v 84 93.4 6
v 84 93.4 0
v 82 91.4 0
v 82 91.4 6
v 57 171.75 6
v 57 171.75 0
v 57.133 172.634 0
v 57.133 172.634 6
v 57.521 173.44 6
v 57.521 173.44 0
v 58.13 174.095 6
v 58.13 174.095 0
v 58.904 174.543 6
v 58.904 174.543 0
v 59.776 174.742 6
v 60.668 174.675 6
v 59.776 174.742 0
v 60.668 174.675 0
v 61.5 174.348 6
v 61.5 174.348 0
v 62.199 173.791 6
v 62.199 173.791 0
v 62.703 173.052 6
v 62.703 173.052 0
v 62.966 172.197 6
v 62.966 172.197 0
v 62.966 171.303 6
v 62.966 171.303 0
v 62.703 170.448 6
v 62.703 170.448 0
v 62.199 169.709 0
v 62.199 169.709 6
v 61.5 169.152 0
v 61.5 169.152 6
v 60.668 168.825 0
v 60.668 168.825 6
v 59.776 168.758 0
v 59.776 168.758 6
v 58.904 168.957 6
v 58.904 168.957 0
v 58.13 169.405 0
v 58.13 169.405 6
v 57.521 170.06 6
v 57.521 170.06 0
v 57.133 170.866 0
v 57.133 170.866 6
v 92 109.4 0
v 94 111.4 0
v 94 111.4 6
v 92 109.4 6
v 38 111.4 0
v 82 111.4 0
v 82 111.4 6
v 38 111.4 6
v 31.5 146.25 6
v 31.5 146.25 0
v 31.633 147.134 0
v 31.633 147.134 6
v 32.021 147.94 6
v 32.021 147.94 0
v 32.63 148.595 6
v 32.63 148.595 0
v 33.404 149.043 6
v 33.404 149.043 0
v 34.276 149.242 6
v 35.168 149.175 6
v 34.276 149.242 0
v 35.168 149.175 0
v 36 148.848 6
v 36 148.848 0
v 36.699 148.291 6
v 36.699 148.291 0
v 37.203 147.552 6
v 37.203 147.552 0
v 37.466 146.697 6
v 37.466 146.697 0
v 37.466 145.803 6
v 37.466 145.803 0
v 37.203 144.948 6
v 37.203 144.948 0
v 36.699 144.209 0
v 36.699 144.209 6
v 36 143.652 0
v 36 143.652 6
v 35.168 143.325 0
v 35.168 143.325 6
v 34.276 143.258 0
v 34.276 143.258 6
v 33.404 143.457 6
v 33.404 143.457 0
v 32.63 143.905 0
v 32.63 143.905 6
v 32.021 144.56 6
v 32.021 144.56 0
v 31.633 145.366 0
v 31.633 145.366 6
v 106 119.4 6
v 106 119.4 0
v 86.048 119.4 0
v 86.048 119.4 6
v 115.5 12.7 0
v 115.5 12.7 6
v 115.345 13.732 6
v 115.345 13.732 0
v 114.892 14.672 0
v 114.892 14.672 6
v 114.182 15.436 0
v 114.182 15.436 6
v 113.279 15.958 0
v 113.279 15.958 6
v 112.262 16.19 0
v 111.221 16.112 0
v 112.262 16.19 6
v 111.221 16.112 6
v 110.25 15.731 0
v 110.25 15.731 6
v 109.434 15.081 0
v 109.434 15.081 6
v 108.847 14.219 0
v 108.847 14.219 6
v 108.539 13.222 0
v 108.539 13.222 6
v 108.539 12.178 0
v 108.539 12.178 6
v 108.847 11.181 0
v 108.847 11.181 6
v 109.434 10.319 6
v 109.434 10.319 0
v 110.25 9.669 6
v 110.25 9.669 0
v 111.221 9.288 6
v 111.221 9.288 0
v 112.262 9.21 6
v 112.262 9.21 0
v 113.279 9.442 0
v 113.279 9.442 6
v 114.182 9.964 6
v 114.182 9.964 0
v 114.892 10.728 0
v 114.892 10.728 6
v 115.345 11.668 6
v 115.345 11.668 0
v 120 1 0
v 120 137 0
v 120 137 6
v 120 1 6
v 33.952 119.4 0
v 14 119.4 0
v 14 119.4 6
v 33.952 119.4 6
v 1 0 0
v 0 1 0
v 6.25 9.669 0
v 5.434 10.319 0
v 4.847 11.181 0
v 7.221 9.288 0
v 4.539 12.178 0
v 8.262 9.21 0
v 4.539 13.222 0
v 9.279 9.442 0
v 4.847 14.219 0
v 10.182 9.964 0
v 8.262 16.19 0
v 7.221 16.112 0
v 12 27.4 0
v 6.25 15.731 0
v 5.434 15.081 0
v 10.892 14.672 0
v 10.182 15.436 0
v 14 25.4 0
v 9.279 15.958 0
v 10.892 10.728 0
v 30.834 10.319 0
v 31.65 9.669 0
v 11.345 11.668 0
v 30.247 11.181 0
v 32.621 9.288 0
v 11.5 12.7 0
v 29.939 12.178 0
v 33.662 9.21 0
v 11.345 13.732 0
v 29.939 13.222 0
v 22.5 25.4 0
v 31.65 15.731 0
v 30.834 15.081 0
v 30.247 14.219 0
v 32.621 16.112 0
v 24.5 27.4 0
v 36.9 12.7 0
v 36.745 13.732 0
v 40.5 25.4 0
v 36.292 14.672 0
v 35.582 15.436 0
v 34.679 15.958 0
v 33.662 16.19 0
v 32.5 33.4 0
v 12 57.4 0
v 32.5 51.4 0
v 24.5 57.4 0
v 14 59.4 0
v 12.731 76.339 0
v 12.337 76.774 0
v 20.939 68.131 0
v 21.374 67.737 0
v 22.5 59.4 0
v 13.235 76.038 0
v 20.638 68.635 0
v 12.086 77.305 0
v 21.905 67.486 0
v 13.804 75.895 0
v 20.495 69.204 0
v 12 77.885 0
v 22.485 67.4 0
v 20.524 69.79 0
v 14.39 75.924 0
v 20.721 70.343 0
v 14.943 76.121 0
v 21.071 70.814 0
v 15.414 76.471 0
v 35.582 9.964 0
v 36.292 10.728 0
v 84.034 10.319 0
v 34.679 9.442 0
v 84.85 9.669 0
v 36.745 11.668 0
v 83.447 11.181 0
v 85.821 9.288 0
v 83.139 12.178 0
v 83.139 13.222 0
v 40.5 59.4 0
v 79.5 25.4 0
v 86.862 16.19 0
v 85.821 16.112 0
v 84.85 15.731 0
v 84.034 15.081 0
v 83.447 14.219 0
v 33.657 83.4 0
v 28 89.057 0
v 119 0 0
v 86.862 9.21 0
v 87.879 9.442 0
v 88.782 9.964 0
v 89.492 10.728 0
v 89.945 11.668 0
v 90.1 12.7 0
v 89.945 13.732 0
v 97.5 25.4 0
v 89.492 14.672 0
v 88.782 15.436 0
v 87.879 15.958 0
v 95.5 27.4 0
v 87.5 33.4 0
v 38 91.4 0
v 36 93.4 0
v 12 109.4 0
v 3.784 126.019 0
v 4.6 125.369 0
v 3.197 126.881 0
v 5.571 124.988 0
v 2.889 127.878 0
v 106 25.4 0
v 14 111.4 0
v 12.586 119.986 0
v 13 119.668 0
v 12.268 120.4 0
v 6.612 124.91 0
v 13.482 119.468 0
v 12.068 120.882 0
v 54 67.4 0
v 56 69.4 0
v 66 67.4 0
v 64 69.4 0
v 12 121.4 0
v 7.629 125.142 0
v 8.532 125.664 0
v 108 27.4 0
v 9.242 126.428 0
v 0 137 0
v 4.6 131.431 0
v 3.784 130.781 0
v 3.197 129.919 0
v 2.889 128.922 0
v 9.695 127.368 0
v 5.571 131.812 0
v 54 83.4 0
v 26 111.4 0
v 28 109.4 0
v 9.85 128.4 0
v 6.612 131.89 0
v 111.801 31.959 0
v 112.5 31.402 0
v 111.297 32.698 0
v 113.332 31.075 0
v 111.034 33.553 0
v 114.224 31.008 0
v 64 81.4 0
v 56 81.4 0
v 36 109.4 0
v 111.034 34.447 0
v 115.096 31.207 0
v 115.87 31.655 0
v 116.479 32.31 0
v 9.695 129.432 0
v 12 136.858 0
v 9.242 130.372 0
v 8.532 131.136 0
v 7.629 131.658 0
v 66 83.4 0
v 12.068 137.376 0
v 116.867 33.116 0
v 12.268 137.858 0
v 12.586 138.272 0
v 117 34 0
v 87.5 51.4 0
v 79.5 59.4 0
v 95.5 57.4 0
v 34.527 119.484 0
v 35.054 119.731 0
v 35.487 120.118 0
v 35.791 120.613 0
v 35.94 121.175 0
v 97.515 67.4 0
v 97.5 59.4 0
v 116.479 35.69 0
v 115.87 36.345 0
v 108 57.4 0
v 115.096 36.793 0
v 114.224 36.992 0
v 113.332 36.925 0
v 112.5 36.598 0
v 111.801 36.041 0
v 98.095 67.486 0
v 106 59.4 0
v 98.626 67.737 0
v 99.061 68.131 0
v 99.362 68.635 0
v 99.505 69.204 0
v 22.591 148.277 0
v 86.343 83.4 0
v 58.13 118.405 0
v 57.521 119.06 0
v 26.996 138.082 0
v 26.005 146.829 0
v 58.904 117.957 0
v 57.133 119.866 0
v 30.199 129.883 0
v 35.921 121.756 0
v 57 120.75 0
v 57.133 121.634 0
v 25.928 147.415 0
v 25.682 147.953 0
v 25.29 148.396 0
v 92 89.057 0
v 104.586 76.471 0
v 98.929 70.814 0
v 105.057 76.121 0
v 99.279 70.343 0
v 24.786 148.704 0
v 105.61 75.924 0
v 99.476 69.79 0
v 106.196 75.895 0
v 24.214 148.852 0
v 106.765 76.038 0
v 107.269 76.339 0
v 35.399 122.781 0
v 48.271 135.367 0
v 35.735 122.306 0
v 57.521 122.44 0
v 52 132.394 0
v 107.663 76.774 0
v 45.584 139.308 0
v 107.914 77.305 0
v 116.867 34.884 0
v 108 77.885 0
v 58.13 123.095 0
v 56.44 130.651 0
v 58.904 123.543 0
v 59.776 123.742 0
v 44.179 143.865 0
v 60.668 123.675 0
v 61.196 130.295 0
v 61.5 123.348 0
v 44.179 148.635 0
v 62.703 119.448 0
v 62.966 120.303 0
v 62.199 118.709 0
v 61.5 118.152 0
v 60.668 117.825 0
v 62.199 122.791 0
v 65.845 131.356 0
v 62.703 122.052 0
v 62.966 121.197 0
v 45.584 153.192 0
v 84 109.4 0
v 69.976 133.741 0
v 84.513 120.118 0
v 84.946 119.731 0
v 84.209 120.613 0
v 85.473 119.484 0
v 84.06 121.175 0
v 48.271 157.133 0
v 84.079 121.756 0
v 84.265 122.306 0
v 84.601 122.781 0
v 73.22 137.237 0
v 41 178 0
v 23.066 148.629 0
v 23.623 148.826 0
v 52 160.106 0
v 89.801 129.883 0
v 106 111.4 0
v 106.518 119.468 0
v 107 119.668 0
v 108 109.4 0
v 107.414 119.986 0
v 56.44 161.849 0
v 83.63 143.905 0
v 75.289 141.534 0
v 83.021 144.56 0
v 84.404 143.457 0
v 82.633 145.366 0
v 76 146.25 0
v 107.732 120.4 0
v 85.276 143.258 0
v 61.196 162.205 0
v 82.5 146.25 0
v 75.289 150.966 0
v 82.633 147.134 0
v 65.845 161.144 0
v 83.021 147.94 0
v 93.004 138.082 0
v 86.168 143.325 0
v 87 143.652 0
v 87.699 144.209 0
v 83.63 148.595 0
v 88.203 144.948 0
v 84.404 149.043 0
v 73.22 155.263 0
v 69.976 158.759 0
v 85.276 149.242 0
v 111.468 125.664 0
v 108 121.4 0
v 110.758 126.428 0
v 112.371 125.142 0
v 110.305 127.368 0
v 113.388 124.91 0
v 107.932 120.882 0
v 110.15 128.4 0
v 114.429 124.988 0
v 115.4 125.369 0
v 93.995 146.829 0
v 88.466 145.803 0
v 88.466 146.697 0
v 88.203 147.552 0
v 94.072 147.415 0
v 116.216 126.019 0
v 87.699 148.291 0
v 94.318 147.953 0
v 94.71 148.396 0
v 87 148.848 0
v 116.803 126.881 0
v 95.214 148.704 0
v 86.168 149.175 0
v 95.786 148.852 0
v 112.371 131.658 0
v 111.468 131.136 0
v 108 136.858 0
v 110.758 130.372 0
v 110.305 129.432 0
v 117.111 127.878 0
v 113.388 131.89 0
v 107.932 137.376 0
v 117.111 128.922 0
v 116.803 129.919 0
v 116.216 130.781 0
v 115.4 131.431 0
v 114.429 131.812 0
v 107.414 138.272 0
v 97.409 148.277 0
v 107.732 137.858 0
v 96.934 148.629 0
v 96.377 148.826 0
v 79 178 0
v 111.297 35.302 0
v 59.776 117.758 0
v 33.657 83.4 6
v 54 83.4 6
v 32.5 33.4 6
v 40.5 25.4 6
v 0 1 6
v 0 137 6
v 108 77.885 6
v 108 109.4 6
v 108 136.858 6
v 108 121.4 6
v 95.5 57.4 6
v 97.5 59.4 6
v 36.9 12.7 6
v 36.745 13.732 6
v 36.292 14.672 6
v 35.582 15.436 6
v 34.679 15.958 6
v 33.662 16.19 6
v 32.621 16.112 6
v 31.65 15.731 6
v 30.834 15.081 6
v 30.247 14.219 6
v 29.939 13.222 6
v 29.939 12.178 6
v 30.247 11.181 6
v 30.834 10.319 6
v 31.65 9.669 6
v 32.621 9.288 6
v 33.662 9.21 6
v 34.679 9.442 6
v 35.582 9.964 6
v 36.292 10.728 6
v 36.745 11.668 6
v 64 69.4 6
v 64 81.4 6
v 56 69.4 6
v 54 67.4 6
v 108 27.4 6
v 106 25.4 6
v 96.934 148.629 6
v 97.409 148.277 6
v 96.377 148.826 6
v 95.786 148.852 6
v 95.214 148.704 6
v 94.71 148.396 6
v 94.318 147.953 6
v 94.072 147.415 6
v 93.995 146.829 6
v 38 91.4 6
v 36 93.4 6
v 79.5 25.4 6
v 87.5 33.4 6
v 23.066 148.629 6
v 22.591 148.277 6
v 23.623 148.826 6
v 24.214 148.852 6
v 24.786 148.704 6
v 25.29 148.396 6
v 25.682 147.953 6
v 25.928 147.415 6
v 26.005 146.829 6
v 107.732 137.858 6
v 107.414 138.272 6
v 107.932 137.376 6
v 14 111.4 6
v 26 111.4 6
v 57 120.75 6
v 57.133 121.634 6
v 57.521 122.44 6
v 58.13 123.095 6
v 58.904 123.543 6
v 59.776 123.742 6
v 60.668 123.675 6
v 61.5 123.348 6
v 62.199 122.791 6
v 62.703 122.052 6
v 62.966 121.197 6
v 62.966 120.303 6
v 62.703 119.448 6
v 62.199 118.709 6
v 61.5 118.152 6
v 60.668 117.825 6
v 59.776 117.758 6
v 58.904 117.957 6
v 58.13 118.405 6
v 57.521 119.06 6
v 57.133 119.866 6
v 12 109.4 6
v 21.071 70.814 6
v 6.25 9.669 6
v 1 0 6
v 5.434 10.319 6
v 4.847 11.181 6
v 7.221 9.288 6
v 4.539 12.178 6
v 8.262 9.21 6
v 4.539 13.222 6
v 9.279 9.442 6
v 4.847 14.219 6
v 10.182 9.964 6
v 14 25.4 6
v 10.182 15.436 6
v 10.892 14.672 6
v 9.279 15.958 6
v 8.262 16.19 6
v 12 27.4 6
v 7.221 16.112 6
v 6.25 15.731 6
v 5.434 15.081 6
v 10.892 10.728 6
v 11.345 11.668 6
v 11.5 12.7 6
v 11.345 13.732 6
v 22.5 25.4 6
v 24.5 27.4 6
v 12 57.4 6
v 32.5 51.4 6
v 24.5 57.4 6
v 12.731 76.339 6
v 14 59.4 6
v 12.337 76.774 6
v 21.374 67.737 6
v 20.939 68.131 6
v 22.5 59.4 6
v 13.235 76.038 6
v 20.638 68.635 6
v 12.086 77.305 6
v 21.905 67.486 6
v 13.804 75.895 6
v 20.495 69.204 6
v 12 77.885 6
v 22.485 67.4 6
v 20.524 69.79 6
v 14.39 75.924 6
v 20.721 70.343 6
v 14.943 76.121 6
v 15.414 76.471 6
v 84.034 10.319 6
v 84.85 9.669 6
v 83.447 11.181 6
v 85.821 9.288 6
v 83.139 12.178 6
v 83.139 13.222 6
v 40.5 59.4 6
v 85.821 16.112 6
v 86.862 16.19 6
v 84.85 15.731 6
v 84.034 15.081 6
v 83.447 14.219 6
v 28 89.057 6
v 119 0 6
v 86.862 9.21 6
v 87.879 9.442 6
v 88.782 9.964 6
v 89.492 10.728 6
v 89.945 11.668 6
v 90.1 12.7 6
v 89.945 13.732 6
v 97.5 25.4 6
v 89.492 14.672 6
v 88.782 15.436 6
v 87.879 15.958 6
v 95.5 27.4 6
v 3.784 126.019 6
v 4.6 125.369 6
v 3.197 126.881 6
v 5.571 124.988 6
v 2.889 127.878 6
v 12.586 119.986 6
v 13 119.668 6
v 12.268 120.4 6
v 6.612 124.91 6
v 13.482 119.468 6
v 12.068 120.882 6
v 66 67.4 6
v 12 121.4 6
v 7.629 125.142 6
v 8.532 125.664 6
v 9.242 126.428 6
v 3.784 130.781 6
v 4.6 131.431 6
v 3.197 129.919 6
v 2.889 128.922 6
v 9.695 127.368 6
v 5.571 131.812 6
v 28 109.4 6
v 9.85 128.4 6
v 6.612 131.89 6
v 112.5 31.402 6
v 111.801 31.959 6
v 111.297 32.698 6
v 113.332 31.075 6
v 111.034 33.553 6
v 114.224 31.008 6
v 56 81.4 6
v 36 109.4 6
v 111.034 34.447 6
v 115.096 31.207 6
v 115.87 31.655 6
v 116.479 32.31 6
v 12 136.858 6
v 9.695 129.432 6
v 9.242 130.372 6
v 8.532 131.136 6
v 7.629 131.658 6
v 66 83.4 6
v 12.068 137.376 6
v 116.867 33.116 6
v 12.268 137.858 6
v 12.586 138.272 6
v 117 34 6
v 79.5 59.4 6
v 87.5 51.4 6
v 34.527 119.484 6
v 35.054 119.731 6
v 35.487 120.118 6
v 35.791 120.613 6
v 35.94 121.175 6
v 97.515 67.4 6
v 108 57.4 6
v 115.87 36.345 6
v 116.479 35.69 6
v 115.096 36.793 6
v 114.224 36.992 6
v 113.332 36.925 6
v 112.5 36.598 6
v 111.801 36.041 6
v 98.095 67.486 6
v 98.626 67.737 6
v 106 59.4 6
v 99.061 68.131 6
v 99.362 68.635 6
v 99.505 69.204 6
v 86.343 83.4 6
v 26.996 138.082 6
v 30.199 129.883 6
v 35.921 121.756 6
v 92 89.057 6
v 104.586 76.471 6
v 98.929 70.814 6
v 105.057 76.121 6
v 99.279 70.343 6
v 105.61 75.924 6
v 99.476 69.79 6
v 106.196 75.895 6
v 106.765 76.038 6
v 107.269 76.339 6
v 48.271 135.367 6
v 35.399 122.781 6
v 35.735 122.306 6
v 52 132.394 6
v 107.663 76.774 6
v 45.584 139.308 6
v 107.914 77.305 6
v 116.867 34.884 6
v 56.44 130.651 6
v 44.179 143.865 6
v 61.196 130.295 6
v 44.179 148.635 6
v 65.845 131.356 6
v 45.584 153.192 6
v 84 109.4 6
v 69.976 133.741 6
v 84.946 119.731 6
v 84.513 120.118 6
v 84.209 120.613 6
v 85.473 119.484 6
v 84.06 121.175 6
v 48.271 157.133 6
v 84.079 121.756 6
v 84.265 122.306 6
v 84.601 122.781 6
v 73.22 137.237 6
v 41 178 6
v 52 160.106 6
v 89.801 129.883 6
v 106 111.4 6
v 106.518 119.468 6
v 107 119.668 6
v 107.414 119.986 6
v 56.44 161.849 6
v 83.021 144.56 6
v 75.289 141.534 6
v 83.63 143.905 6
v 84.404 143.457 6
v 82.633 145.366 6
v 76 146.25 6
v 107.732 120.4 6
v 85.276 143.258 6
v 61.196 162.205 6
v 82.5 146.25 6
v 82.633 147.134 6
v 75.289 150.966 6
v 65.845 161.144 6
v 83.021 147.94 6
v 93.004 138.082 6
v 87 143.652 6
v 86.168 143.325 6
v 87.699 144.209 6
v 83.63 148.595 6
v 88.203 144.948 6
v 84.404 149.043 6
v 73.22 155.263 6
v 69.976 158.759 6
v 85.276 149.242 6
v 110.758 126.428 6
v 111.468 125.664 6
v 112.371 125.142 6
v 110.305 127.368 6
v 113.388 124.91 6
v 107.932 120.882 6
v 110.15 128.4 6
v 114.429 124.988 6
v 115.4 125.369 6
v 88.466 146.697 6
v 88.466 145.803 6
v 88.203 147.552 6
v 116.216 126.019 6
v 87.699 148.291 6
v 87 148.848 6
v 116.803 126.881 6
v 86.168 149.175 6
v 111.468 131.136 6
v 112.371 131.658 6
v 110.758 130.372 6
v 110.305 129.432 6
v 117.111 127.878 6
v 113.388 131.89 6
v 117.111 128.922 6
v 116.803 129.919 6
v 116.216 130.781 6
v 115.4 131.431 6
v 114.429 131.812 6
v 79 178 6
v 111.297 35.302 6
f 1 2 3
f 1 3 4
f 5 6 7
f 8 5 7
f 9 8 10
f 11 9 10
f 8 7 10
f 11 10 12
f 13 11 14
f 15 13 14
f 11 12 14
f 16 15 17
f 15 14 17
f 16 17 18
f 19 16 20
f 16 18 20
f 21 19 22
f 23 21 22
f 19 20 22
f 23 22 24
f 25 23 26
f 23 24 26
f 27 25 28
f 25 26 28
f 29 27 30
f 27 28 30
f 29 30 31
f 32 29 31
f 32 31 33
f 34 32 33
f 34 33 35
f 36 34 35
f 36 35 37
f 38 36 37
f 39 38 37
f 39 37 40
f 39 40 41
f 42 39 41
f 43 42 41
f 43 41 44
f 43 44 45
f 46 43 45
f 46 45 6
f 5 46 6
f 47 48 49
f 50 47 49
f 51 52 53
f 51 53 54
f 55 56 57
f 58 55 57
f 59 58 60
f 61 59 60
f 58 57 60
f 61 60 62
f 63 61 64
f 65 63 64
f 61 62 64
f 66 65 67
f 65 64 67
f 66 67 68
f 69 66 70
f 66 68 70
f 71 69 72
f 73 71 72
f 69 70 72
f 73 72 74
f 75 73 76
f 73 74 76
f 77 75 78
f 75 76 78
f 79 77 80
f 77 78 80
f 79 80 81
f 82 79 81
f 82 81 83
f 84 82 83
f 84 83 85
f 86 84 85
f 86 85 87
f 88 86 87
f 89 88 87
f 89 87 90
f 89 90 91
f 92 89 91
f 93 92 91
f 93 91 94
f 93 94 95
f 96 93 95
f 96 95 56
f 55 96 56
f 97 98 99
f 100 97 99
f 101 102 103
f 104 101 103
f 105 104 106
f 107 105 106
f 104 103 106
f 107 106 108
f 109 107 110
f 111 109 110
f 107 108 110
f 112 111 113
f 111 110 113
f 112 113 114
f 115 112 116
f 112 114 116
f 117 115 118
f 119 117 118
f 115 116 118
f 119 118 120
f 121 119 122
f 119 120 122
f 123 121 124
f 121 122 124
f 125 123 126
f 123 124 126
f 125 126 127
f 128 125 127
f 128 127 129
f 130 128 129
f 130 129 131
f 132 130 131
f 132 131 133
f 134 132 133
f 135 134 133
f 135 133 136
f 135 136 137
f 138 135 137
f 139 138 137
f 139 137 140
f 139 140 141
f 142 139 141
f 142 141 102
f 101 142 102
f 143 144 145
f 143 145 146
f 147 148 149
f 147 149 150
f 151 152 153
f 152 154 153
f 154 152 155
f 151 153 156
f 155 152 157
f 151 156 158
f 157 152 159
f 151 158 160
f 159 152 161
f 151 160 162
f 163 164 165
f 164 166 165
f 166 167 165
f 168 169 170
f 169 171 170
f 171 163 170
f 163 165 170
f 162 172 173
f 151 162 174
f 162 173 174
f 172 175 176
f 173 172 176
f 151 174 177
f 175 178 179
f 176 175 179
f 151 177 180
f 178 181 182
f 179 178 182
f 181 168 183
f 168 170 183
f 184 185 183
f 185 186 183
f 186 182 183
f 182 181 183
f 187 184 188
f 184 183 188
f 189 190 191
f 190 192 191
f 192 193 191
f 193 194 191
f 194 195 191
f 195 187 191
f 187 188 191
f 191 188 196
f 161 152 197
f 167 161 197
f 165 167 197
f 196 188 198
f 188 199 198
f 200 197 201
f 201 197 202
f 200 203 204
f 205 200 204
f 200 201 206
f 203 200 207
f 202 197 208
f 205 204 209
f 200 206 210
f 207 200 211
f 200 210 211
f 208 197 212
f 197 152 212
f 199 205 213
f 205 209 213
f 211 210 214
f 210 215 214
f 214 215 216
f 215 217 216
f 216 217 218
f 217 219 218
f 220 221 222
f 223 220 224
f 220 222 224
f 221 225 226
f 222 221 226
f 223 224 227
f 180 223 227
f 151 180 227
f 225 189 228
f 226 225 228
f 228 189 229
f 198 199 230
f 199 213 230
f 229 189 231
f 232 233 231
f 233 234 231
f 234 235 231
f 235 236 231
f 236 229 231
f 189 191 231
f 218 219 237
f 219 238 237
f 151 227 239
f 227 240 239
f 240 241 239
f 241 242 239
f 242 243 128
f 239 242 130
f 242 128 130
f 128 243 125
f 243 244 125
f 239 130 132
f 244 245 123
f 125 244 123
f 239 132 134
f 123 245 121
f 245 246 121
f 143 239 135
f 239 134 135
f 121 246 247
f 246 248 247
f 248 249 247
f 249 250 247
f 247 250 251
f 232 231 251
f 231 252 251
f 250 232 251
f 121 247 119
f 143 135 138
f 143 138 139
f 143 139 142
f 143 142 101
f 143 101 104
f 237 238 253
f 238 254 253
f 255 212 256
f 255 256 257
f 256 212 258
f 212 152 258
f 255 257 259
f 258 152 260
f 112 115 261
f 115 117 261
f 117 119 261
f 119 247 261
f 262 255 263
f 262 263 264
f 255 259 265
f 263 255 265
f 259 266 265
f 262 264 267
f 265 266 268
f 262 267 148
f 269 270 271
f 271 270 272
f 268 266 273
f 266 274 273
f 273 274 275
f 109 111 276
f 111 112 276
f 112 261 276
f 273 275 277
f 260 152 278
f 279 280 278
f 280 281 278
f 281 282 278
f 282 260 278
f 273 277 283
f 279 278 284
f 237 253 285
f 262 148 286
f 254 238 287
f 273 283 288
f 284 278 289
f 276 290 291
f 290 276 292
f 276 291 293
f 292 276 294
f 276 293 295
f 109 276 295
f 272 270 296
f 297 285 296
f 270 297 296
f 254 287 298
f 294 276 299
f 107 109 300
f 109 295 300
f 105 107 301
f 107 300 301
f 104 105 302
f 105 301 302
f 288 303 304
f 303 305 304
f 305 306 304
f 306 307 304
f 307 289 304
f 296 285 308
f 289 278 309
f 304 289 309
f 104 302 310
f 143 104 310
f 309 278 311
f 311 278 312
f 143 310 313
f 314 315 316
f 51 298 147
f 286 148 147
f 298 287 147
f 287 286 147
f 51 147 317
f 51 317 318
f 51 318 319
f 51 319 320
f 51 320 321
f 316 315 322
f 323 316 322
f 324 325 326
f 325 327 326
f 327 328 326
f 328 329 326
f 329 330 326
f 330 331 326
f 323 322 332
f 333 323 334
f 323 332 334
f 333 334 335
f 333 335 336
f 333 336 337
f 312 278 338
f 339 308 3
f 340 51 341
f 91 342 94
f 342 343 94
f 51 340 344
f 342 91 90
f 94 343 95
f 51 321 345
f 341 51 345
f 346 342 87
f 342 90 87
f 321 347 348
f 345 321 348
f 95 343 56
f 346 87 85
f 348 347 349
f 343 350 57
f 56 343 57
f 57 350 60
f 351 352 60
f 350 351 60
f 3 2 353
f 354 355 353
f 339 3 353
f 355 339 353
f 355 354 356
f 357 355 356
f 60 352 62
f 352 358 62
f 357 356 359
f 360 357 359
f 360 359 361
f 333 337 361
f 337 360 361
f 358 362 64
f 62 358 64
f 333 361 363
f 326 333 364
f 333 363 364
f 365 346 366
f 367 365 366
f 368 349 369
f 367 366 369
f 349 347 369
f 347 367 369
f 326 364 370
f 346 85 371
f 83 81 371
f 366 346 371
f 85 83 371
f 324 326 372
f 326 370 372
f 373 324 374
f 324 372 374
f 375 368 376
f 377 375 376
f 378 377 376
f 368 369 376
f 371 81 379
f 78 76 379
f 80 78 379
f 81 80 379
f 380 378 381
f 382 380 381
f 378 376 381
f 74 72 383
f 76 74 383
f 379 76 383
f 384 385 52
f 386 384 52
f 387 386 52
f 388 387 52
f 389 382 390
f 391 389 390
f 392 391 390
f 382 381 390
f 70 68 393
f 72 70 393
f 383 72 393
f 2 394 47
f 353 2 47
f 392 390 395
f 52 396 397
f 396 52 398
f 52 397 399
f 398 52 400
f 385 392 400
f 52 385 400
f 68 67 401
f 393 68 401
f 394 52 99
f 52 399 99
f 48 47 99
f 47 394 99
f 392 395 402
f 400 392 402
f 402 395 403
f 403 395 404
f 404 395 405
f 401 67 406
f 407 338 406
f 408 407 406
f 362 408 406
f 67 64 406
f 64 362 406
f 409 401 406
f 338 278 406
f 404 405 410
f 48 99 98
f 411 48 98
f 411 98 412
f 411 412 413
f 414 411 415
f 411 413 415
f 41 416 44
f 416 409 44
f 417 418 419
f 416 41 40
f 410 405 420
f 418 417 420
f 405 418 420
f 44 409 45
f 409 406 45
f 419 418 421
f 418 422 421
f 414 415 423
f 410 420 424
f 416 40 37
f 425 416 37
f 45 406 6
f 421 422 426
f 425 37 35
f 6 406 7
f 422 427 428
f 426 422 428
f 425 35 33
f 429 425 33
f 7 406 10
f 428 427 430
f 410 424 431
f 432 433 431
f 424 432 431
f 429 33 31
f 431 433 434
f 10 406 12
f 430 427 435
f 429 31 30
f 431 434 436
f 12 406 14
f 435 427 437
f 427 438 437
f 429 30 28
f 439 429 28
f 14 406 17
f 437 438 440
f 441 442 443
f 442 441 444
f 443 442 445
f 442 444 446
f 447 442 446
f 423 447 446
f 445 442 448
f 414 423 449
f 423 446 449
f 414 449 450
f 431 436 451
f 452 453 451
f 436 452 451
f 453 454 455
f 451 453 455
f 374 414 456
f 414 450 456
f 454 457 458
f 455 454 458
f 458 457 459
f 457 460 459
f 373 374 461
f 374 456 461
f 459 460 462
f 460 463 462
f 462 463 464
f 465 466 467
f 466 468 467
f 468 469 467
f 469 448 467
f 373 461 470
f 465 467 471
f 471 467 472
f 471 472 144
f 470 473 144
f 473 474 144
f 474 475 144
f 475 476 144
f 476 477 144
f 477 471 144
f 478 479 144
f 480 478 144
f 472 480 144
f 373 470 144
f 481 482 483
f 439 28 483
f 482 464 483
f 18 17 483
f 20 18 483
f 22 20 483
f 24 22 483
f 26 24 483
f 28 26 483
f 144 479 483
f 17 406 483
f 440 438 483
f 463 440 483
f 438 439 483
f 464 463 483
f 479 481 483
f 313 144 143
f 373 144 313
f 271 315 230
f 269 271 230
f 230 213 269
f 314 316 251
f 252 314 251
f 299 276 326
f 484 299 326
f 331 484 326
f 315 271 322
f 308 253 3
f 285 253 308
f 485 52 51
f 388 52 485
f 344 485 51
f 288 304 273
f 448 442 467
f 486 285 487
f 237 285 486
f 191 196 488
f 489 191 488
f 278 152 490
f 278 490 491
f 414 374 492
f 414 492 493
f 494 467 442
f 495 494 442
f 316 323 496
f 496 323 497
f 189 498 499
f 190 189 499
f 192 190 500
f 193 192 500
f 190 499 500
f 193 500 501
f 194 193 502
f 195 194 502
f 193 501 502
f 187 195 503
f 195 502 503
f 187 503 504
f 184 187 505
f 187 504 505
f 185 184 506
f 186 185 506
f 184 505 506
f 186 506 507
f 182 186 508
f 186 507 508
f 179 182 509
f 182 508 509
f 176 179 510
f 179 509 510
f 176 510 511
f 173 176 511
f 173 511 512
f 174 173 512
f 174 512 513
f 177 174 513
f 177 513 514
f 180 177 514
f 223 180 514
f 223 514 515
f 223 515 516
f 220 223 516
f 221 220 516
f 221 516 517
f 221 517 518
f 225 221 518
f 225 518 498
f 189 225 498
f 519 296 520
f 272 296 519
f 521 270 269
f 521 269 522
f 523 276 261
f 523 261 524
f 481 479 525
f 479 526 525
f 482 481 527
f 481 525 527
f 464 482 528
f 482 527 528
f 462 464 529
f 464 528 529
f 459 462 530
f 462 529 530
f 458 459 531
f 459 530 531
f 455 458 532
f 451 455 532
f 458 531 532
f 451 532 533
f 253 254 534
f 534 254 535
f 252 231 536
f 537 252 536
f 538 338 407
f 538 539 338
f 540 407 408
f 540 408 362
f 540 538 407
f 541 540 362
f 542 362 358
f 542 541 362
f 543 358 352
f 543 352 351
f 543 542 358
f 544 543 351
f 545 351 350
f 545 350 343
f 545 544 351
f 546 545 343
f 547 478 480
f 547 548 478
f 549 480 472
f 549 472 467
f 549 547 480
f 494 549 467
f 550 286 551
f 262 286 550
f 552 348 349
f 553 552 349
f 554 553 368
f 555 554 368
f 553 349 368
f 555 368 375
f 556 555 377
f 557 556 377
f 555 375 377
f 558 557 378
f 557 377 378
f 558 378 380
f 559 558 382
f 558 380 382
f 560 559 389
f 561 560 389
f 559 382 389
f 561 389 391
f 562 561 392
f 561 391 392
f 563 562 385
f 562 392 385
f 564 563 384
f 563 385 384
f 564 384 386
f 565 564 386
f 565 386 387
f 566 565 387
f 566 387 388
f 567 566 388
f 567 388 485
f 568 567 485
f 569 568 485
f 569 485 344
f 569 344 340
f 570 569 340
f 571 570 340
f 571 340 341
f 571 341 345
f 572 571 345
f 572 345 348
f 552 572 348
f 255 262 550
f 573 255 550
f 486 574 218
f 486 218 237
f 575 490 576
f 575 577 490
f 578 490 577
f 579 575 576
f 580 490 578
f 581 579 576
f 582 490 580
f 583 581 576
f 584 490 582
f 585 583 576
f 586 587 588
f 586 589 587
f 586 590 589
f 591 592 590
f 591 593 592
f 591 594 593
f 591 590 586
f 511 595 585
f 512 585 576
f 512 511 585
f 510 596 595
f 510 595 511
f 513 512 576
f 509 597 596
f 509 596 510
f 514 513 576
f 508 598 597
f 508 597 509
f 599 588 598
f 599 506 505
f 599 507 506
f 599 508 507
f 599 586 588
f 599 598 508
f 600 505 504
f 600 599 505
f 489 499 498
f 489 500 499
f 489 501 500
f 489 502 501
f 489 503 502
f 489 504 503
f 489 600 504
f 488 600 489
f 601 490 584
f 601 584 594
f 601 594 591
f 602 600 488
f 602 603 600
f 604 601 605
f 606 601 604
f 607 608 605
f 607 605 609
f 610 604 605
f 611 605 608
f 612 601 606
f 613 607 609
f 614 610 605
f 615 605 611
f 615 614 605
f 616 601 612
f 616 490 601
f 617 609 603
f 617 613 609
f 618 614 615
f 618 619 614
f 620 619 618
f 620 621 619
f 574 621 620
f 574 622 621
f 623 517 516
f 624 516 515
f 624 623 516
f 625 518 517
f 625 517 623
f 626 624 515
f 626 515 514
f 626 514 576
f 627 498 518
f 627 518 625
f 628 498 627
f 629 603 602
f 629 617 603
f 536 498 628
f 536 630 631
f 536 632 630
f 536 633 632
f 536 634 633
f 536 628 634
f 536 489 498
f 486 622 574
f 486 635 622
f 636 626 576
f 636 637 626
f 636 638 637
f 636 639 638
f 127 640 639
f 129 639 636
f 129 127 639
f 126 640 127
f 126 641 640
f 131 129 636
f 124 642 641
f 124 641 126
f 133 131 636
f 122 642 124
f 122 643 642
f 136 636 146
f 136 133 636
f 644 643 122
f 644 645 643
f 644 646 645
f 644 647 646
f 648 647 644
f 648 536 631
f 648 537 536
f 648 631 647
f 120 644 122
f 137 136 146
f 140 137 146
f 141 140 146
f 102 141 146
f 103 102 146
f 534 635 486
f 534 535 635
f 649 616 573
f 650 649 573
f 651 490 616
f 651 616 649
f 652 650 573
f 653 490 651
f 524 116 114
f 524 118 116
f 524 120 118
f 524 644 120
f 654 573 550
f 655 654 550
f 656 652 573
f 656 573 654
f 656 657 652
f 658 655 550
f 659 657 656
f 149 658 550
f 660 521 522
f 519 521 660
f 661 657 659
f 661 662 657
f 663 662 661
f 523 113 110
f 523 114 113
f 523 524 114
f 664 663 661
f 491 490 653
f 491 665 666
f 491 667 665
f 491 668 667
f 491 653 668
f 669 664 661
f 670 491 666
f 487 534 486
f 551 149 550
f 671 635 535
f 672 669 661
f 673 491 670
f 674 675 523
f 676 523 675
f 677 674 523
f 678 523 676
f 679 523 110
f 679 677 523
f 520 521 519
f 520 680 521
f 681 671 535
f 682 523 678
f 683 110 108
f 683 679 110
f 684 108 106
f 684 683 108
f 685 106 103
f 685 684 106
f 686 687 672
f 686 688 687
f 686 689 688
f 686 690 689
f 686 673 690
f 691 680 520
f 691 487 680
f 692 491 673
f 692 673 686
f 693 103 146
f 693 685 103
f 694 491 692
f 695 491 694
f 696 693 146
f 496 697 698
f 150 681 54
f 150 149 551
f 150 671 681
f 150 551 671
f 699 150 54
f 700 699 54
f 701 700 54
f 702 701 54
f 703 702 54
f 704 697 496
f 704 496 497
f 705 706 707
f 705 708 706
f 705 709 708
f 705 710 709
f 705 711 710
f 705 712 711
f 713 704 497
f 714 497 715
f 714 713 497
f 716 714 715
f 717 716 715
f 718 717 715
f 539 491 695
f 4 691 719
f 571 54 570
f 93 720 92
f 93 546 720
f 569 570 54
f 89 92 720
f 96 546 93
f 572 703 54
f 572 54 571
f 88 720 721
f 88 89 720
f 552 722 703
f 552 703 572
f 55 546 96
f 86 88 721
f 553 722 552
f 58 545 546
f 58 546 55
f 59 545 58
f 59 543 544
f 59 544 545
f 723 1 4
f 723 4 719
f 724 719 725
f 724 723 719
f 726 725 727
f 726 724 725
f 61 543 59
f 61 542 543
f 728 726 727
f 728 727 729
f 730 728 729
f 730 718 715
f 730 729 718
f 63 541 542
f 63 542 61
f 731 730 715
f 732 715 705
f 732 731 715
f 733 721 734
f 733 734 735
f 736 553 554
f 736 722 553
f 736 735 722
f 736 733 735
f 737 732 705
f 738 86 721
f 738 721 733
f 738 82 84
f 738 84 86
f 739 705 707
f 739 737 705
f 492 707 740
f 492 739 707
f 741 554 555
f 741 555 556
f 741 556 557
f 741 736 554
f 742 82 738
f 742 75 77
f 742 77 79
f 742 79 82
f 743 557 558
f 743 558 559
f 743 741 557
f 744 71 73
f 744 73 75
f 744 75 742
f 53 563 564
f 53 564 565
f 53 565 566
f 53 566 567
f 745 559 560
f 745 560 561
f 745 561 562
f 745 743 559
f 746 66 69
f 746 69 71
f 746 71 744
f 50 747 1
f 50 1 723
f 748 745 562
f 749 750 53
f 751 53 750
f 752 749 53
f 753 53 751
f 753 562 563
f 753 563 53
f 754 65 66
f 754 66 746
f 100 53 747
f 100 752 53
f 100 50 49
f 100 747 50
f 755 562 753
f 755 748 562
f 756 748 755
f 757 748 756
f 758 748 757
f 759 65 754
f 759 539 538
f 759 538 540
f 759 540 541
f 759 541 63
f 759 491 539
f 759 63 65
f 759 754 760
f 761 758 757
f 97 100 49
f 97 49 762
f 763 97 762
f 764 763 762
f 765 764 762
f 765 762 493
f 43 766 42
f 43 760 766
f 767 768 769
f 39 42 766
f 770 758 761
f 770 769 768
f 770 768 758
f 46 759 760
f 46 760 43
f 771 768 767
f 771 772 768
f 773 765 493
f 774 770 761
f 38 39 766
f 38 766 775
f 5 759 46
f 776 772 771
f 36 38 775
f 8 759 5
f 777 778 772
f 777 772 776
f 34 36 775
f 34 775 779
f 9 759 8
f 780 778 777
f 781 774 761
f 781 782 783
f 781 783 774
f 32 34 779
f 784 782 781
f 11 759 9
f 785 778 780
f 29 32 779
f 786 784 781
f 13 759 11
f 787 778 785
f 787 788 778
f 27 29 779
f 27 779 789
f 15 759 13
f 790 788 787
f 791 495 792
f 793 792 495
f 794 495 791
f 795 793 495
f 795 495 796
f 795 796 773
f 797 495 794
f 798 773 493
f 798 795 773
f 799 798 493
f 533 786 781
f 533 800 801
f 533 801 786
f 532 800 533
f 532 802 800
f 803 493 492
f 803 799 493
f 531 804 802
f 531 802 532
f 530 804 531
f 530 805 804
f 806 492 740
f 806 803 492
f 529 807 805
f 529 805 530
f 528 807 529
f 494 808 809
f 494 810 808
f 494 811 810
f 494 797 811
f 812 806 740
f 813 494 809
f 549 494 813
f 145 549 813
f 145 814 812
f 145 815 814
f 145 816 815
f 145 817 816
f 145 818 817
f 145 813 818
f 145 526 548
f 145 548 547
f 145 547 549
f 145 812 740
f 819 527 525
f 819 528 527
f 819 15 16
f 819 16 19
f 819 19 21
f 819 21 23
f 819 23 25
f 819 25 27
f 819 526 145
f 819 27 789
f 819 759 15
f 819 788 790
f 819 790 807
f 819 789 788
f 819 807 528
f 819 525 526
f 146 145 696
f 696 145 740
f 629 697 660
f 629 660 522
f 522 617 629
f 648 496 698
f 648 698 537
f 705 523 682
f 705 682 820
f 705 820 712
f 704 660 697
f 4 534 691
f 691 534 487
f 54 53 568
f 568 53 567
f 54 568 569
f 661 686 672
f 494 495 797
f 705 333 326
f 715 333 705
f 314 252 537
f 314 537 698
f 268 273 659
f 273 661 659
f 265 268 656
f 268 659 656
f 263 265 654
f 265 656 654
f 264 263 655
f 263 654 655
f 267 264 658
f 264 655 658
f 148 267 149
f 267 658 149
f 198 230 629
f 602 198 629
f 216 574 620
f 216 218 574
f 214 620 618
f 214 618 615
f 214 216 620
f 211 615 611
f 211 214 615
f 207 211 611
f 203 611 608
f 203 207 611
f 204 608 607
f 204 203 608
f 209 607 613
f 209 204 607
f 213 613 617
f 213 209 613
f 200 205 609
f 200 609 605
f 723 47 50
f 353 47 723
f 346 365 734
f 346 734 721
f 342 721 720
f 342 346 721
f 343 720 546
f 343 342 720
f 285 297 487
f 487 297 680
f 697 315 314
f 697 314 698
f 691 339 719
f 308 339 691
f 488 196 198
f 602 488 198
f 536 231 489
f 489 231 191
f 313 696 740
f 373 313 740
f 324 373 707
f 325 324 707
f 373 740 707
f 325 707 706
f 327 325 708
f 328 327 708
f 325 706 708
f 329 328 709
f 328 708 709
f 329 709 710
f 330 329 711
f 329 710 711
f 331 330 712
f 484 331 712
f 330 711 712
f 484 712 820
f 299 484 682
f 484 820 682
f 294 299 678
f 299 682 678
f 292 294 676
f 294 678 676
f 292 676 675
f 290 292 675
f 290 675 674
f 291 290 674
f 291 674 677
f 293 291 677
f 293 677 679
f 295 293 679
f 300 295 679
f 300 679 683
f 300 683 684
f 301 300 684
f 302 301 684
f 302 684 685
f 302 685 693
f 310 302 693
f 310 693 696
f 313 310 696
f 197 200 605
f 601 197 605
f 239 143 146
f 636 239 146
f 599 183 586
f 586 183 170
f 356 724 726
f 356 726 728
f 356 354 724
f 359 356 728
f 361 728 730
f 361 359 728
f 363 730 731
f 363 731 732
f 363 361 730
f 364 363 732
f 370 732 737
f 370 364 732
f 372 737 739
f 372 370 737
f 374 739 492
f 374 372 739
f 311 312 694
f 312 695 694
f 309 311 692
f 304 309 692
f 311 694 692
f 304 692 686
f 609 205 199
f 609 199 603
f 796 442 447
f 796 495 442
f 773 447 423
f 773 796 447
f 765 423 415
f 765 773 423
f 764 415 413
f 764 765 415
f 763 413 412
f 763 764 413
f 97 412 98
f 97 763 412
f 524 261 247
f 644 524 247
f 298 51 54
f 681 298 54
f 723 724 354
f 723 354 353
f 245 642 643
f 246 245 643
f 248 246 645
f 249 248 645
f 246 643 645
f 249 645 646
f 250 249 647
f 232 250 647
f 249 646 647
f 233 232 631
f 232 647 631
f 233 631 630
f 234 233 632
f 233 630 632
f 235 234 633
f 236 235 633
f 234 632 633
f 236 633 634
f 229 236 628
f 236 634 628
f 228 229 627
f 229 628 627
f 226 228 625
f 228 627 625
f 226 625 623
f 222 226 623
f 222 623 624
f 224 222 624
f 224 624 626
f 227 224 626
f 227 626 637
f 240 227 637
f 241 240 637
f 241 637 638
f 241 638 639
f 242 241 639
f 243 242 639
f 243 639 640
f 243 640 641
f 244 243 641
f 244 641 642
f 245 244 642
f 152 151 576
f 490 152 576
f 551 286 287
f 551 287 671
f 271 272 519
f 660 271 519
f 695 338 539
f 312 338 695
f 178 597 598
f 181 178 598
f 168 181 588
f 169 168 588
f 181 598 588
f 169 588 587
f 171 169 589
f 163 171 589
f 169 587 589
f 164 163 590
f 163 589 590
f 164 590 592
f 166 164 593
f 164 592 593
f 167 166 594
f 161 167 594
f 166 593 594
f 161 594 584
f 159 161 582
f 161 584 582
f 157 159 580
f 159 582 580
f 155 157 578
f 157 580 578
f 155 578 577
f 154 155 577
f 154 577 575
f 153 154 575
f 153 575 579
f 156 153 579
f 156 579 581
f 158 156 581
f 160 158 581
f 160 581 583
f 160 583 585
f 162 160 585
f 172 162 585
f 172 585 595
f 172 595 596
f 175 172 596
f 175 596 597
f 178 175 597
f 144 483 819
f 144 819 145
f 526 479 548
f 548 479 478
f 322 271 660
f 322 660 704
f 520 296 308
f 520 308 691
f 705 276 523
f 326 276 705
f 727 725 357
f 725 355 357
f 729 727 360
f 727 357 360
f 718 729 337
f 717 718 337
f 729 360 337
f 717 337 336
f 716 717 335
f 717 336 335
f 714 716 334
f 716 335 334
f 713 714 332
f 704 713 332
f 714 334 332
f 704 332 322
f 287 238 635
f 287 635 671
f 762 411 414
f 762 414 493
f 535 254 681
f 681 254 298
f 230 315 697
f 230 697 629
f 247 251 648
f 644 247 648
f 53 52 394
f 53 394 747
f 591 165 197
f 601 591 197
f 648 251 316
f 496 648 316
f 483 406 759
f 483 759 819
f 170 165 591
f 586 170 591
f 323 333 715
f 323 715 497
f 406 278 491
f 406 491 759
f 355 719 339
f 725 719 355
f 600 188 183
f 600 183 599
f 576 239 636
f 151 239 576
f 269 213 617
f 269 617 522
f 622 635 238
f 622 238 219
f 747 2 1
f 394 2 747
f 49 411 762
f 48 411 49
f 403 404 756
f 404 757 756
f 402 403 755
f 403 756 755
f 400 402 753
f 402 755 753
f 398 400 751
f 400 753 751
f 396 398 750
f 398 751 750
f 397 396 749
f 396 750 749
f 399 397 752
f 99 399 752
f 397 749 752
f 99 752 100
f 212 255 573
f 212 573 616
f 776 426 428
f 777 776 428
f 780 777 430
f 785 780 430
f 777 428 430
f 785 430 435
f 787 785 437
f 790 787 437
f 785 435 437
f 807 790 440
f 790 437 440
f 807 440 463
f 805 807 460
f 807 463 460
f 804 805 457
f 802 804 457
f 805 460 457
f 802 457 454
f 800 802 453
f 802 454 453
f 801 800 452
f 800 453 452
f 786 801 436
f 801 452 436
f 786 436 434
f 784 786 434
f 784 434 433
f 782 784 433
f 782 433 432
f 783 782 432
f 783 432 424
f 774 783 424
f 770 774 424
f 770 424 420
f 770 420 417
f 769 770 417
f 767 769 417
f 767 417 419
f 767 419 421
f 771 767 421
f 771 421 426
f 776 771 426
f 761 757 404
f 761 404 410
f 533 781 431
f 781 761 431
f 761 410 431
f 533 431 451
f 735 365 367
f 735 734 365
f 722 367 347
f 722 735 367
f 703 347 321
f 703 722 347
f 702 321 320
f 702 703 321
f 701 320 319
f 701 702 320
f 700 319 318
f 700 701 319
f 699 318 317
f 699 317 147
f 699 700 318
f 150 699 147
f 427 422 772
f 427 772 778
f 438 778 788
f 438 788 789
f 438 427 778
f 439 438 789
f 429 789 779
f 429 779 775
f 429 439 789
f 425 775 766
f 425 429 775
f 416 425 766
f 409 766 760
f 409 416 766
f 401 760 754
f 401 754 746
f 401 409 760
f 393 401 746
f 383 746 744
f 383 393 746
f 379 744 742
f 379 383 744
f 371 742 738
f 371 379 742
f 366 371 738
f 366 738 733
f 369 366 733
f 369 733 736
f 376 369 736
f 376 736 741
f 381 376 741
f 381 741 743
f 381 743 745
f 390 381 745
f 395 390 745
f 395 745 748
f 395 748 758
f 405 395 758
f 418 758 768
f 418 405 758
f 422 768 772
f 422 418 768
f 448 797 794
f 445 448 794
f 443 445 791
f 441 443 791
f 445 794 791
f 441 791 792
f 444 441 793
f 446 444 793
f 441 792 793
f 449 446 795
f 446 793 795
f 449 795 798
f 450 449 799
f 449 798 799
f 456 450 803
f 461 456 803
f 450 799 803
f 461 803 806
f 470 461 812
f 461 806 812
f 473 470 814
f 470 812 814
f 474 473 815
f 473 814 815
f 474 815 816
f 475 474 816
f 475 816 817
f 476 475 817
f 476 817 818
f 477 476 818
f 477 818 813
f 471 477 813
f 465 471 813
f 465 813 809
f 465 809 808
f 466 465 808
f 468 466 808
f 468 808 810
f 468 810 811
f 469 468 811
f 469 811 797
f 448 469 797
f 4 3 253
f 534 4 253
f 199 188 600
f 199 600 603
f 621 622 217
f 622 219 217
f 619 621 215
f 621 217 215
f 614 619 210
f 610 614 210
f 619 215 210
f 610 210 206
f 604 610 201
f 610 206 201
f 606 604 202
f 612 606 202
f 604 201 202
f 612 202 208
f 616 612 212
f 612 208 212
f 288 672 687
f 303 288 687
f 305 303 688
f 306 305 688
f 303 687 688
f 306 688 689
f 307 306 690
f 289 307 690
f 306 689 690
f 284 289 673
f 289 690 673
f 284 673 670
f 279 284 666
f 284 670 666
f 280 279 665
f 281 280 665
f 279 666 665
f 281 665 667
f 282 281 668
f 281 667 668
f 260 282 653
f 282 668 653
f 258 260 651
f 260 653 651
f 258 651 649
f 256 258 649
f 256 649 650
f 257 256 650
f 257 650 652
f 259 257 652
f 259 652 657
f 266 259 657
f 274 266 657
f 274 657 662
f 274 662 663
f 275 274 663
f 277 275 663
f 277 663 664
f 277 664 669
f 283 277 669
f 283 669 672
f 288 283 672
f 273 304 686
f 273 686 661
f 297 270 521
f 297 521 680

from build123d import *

# Parameters (mm, degrees)
ESBO_O1_R                = 16
RESSALTO_EXTRUS_O1_DEPTH = 6
ESBO_O2_R                = 3
ESBO_O2_W                = 55
ESBO_O2_H                = 34
ESBO_O2_W_2              = 48
ESBO_O2_H_2              = 20
ESBO_O2_W_3              = 12.5
CORTE_EXTRUS_O1_DEPTH    = 215.755675129
RESSALTO_EXTRUS_O2_DEPTH = 6
ESBO_O4_R                = 3.5
CORTE_EXTRUS_O2_DEPTH    = 215.755675129
FILETE1_R                = 2
CHANFRO1_SIZE            = 8
CHANFRO2_SIZE            = 2
ESBO_O5_R                = 3.5
CORTE_EXTRUS_O3_DEPTH    = 215.755675129
CHANFRO3_SIZE            = 1
ESBO_O8_R                = 3
CORTE_EXTRUS_O5_DEPTH    = 215.755675129


with BuildPart() as part:
    # Esboço1 → Ressalto-extrusão1 (new body)
    with BuildSketch(Plane.XY):
        Polygon((0, 0), (0, 137), (41, 178), (79, 178), (120, 137), (120, 0), align=None)
        with Locations((60, 146.25)):
            Circle(ESBO_O1_R, mode=Mode.SUBTRACT)
    extrude(amount=RESSALTO_EXTRUS_O1_DEPTH)

    # Esboço2 → Corte-extrusão1 (cut, through all)
    with BuildSketch(Plane(origin=(0, 0, 0), x_dir=(-1, 0, 0), z_dir=(0, 0, -1))):
        with Locations((-60, 171.75)):
            Circle(ESBO_O2_R)
        with Locations((-34.5, 146.25)):
            Circle(ESBO_O2_R)
        with Locations((-60, 120.75)):
            Circle(ESBO_O2_R)
        with Locations((-85.5, 146.25)):
            Circle(ESBO_O2_R)
        with Locations((-60, 42.4)):
            Rectangle(ESBO_O2_W, ESBO_O2_H)
        Polygon((-56, 83.4), (-28, 83.4), (-28, 111.4), (-12, 111.4), (-12, 67.4), (-56, 67.4), align=None)
        with Locations((-60, 101.4)):
            Rectangle(ESBO_O2_W_2, ESBO_O2_H_2)
        with Locations((-18.25, 42.4)):
            Rectangle(ESBO_O2_W_3, ESBO_O2_H)
        Polygon((-64, 83.4), (-64, 67.4), (-108, 67.4), (-108, 111.4), (-92, 111.4), (-92, 83.4), align=None)
        with Locations((-101.75, 42.4)):
            Rectangle(ESBO_O2_W_3, ESBO_O2_H)
        with BuildLine():
            Line((-93.472953207, 152.213338294), (-108, 137.686291501))
            Line((-108, 137.686291501), (-108, 119.4))
            Line((-108, 119.4), (-80.858511452, 119.4))
            ThreePointArc((-80.858511452, 119.4), (-91.735718134, 134.049828095), (-93.472953207, 152.213338294))
        make_face()
        with BuildLine():
            Line((-26.527046793, 152.213338294), (-12, 137.686291501))
            Line((-12, 137.686291501), (-12, 119.4))
            Line((-12, 119.4), (-39.141488548, 119.4))
            ThreePointArc((-39.141488548, 119.4), (-28.264281866, 134.049828095), (-26.527046793, 152.213338294))
        make_face()
    extrude(amount=-CORTE_EXTRUS_O1_DEPTH, mode=Mode.SUBTRACT)

    # Esboço3 → Ressalto-extrusão2 (add, through all)
    with BuildSketch(Plane.XY.offset(6)):
        Polygon((28, 89.056854249), (12, 73.056854249), (12, 67.4), (17.656854249, 67.4), (33.656854249, 83.4), (28, 83.4), align=None)
        Polygon((86.343145751, 83.4), (102.343145751, 67.4), (108, 67.4), (108, 73.056854249), (92, 89.056854249), (92, 83.4), align=None)
    extrude(amount=-RESSALTO_EXTRUS_O2_DEPTH)

    # Esboço4 → Corte-extrusão2 (cut, through all)
    with BuildSketch(Plane.XY.offset(6)):
        with Locations((8, 12.7)):
            Circle(ESBO_O4_R)
        with Locations((33.4, 12.7)):
            Circle(ESBO_O4_R)
        with Locations((86.6, 12.7)):
            Circle(ESBO_O4_R)
        with Locations((112, 12.7)):
            Circle(ESBO_O4_R)
    extrude(amount=-CORTE_EXTRUS_O2_DEPTH, mode=Mode.SUBTRACT)

    # Filete1
    filete1_edges = [part.edges().sort_by_distance(p)[0] for p in [
        (39.141488548, 119.4, 3),
        (26.527046793, 152.213338294, 3),
        (12, 137.686291501, 3),
        (12, 119.4, 3),
        (108, 73.056854249, 3),
        (102.343145751, 67.4, 3),
        (17.656854249, 67.4, 3),
        (12, 73.056854249, 3),
        (93.472953207, 152.213338294, 3),
        (80.858511452, 119.4, 3),
        (108, 119.4, 3),
        (108, 137.686291501, 3),
    ]]
    fillet(filete1_edges, radius=FILETE1_R)

    # Chanfro1
    chanfro1_edges = [part.edges().sort_by_distance(p)[0] for p in [
        (87.5, 25.4, 3),
        (87.5, 59.4, 3),
        (32.5, 59.4, 3),
        (32.5, 25.4, 3),
    ]]
    chamfer(chanfro1_edges, length=CHANFRO1_SIZE)

    # Chanfro2
    chanfro2_edges = [part.edges().sort_by_distance(p)[0] for p in [
        (64, 83.4, 3),
        (64, 67.4, 3),
        (108, 111.4, 3),
        (92, 111.4, 3),
        (84, 91.4, 3),
        (84, 111.4, 3),
        (36, 111.4, 3),
        (36, 91.4, 3),
        (95.5, 25.4, 3),
        (108, 25.4, 3),
        (108, 59.4, 3),
        (95.5, 59.4, 3),
        (24.5, 25.4, 3),
        (24.5, 59.4, 3),
        (12, 59.4, 3),
        (12, 25.4, 3),
        (28, 111.4, 3),
        (12, 111.4, 3),
        (56, 67.4, 3),
        (56, 83.4, 3),
    ]]
    chamfer(chanfro2_edges, length=CHANFRO2_SIZE)

    # Esboço5 → Corte-extrusão3 (cut, through all)
    with BuildSketch(Plane.XY.offset(6)):
        with Locations((6.35, 128.4)):
            Circle(ESBO_O5_R)
        with Locations(Location((113.65, 128.4, 0), (0, 0, 180))):
            Circle(ESBO_O5_R)
    extrude(amount=-CORTE_EXTRUS_O3_DEPTH, mode=Mode.SUBTRACT)

    # Chanfro3
    chanfro3_edges = [part.edges().sort_by_distance(p)[0] for p in [
        (0, 0, 3),
        (120, 0, 3),
    ]]
    chamfer(chanfro3_edges, length=CHANFRO3_SIZE)

    # Esboço8 → Corte-extrusão5 (cut, through all)
    with BuildSketch(Plane.XY.offset(6)):
        with Locations((114, 34)):
            Circle(ESBO_O8_R)
    extrude(amount=-CORTE_EXTRUS_O5_DEPTH, mode=Mode.SUBTRACT)


solid = part.part
